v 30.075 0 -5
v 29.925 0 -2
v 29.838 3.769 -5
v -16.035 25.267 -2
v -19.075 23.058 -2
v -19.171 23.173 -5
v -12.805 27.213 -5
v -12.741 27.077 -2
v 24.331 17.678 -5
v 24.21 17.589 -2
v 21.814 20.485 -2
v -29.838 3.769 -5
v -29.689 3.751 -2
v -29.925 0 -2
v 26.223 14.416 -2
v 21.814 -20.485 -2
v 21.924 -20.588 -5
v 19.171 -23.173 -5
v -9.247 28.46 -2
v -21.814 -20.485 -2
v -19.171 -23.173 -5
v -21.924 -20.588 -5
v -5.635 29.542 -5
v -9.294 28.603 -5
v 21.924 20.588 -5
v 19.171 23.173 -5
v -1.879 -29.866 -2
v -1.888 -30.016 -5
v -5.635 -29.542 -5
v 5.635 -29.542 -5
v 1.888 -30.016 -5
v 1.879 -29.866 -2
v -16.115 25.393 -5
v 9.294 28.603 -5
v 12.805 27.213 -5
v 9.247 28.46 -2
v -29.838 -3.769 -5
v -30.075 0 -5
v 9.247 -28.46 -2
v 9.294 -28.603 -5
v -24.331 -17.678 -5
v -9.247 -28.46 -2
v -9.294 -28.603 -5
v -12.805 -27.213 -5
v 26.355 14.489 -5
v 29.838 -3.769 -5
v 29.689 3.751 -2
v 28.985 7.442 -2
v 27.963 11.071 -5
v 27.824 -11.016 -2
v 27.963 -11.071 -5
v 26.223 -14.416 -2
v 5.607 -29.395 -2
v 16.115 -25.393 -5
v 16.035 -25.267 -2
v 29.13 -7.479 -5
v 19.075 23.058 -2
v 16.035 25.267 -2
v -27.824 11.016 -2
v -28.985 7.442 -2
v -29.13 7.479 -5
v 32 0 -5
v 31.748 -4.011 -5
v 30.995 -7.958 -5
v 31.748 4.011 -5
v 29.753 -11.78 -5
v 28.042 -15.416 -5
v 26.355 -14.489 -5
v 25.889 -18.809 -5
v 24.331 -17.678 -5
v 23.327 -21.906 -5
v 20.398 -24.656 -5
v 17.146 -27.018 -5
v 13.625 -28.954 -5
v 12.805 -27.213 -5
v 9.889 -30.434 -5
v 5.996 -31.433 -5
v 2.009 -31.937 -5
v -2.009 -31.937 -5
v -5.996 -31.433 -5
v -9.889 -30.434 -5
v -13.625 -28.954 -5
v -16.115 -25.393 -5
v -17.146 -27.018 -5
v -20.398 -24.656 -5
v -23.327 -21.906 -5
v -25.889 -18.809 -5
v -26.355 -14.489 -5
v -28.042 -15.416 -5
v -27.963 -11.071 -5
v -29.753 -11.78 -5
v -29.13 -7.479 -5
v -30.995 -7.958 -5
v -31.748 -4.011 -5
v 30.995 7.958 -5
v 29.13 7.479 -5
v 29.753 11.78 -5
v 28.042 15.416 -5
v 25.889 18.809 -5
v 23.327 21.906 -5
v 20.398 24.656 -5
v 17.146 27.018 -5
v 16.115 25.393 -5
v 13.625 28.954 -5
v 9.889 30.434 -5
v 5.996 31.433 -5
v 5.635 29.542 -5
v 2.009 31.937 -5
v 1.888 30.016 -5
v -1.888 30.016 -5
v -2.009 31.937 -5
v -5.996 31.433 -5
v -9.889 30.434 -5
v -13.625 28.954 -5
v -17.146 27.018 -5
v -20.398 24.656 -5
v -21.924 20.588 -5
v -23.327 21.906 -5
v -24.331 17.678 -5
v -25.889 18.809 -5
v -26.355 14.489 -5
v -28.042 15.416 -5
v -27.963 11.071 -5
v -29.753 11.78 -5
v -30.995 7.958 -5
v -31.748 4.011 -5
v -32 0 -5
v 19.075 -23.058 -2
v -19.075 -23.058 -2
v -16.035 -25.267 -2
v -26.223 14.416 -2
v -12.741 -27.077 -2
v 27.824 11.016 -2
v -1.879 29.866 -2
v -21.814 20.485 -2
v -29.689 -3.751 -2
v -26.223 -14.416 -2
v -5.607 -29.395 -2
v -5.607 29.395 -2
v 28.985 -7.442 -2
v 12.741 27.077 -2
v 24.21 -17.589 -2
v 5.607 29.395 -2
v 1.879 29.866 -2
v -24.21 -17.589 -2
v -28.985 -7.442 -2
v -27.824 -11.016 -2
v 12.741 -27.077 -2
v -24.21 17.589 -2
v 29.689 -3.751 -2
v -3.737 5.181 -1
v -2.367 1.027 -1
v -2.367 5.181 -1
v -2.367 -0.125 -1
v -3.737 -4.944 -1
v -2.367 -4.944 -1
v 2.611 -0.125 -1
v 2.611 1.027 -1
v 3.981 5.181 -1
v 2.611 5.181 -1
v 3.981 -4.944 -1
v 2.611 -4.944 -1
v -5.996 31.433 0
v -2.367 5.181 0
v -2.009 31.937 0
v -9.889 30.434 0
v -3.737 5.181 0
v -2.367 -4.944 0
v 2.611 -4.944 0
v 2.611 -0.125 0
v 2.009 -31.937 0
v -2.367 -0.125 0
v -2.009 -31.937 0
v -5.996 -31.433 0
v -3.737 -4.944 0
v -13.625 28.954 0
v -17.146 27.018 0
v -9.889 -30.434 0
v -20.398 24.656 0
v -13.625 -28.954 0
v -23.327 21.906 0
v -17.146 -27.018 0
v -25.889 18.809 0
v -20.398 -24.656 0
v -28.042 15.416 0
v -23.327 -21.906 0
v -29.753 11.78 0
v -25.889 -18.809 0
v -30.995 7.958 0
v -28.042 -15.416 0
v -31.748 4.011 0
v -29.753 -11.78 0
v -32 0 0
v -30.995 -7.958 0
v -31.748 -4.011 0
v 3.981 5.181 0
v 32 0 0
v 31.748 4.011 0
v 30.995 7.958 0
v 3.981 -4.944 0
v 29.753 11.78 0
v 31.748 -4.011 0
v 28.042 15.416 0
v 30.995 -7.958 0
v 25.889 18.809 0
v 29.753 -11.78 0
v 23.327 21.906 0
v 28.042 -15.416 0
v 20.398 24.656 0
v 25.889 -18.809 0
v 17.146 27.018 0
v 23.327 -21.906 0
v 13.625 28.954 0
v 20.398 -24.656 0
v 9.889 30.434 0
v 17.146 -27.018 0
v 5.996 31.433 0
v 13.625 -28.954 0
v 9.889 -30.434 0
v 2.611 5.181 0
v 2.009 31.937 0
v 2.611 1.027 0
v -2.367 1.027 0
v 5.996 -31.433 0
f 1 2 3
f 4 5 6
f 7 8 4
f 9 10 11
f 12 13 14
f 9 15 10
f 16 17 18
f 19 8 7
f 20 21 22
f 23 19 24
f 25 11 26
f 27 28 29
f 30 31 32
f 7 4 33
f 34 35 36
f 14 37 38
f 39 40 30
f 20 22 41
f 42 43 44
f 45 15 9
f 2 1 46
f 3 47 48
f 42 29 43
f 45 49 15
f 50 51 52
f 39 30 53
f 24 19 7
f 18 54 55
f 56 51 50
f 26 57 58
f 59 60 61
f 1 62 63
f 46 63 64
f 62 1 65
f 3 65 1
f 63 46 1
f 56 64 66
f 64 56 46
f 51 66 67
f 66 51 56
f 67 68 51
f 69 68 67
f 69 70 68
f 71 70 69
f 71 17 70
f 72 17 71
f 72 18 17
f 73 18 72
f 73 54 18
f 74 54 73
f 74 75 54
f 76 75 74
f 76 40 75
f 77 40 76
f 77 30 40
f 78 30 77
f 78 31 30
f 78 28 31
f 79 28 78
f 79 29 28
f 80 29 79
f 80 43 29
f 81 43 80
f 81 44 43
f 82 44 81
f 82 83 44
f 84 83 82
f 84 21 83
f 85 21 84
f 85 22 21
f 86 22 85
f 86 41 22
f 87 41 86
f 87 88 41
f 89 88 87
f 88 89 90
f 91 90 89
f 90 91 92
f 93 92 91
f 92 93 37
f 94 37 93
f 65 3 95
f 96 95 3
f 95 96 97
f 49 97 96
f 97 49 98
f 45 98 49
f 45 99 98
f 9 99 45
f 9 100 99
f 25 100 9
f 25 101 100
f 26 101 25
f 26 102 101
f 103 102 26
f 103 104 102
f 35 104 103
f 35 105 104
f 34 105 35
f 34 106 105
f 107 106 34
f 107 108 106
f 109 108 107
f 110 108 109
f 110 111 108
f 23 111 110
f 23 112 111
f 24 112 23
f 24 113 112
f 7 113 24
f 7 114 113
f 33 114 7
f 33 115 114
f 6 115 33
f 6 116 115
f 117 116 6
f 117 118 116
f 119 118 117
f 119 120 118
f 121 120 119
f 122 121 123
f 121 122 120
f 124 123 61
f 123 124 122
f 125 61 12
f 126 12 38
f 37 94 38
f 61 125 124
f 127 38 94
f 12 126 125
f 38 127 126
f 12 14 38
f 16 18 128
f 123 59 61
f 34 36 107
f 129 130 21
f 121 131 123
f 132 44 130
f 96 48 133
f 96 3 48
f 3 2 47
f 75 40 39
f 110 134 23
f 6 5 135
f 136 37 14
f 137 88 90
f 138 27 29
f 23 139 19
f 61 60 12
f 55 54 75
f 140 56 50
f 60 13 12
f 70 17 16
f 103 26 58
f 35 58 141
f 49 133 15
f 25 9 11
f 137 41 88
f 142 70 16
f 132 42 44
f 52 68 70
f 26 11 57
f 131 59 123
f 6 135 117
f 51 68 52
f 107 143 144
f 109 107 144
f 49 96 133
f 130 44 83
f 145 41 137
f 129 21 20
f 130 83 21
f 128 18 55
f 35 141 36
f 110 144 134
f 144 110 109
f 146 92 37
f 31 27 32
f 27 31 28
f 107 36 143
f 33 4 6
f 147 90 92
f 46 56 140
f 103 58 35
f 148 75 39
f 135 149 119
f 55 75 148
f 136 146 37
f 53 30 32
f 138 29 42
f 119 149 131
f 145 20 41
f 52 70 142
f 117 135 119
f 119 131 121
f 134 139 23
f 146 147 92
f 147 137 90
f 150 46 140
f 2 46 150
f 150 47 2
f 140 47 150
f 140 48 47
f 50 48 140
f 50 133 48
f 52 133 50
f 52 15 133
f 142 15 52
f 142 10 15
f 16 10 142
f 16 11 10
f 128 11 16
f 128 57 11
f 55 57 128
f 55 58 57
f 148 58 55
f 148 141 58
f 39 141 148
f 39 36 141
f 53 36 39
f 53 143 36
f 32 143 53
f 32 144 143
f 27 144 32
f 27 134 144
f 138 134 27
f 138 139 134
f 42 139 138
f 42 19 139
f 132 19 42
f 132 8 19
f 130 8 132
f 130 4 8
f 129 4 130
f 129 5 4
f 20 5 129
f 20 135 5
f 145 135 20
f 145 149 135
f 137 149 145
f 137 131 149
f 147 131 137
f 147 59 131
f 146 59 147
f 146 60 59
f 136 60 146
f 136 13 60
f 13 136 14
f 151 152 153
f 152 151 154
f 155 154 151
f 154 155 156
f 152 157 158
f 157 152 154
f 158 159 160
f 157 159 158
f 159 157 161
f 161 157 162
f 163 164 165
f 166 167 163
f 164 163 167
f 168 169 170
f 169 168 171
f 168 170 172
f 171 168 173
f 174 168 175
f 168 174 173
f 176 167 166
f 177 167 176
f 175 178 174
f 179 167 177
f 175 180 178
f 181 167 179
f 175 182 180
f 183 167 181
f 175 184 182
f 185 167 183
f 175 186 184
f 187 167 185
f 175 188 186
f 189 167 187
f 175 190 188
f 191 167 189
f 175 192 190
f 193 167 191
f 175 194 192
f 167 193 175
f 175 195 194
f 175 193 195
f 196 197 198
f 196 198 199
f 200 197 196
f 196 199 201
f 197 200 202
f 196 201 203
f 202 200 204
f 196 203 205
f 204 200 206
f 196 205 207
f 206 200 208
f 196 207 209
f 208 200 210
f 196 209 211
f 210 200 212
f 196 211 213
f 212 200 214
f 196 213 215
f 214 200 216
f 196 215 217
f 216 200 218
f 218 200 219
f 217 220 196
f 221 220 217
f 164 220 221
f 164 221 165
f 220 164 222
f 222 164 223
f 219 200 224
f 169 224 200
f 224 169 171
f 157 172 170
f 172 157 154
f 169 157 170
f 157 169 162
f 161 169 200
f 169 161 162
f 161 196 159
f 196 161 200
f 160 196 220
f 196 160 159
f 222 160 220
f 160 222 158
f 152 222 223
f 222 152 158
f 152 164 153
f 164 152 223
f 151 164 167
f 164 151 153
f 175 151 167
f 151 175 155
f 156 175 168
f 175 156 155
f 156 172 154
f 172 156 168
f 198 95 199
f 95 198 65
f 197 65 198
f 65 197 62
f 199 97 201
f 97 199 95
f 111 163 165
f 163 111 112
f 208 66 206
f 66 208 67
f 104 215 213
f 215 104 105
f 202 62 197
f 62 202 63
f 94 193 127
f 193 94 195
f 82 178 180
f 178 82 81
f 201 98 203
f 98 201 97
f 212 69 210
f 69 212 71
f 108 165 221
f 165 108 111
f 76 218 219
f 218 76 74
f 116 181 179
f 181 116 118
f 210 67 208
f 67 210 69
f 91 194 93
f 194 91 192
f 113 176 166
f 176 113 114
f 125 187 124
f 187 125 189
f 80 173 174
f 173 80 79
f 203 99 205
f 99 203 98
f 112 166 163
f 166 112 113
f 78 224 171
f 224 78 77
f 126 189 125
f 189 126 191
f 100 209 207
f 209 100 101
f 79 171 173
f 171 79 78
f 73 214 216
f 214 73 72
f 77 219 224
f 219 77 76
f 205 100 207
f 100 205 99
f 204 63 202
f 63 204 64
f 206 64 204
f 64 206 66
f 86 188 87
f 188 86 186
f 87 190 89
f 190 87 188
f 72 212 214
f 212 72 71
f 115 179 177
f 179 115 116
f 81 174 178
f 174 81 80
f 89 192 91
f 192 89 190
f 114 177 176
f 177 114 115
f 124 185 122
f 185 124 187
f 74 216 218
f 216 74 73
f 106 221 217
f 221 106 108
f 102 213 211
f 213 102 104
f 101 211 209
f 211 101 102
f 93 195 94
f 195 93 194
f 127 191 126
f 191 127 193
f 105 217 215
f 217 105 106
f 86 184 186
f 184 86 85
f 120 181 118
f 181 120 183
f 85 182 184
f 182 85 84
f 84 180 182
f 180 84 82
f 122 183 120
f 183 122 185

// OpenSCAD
$fn = 50;


difference() {
	union() {
		translate(v = [0, 0, -5.0000000000]) {
			cylinder(h = 5, r = 32.0000000000);
		}
	}
	union() {
		#translate(v = [0, 0, -5.0000000000]) {
			cylinder(h = 3, r1 = 30.0750000000, r2 = 29.9250000000);
		}
		translate(v = [0, 0, -1]) {
			linear_extrude(height = 1) {
				text(font = "Impact", halign = "center", size = 10, text = "H", valign = "center");
			}
		}
	}
}
